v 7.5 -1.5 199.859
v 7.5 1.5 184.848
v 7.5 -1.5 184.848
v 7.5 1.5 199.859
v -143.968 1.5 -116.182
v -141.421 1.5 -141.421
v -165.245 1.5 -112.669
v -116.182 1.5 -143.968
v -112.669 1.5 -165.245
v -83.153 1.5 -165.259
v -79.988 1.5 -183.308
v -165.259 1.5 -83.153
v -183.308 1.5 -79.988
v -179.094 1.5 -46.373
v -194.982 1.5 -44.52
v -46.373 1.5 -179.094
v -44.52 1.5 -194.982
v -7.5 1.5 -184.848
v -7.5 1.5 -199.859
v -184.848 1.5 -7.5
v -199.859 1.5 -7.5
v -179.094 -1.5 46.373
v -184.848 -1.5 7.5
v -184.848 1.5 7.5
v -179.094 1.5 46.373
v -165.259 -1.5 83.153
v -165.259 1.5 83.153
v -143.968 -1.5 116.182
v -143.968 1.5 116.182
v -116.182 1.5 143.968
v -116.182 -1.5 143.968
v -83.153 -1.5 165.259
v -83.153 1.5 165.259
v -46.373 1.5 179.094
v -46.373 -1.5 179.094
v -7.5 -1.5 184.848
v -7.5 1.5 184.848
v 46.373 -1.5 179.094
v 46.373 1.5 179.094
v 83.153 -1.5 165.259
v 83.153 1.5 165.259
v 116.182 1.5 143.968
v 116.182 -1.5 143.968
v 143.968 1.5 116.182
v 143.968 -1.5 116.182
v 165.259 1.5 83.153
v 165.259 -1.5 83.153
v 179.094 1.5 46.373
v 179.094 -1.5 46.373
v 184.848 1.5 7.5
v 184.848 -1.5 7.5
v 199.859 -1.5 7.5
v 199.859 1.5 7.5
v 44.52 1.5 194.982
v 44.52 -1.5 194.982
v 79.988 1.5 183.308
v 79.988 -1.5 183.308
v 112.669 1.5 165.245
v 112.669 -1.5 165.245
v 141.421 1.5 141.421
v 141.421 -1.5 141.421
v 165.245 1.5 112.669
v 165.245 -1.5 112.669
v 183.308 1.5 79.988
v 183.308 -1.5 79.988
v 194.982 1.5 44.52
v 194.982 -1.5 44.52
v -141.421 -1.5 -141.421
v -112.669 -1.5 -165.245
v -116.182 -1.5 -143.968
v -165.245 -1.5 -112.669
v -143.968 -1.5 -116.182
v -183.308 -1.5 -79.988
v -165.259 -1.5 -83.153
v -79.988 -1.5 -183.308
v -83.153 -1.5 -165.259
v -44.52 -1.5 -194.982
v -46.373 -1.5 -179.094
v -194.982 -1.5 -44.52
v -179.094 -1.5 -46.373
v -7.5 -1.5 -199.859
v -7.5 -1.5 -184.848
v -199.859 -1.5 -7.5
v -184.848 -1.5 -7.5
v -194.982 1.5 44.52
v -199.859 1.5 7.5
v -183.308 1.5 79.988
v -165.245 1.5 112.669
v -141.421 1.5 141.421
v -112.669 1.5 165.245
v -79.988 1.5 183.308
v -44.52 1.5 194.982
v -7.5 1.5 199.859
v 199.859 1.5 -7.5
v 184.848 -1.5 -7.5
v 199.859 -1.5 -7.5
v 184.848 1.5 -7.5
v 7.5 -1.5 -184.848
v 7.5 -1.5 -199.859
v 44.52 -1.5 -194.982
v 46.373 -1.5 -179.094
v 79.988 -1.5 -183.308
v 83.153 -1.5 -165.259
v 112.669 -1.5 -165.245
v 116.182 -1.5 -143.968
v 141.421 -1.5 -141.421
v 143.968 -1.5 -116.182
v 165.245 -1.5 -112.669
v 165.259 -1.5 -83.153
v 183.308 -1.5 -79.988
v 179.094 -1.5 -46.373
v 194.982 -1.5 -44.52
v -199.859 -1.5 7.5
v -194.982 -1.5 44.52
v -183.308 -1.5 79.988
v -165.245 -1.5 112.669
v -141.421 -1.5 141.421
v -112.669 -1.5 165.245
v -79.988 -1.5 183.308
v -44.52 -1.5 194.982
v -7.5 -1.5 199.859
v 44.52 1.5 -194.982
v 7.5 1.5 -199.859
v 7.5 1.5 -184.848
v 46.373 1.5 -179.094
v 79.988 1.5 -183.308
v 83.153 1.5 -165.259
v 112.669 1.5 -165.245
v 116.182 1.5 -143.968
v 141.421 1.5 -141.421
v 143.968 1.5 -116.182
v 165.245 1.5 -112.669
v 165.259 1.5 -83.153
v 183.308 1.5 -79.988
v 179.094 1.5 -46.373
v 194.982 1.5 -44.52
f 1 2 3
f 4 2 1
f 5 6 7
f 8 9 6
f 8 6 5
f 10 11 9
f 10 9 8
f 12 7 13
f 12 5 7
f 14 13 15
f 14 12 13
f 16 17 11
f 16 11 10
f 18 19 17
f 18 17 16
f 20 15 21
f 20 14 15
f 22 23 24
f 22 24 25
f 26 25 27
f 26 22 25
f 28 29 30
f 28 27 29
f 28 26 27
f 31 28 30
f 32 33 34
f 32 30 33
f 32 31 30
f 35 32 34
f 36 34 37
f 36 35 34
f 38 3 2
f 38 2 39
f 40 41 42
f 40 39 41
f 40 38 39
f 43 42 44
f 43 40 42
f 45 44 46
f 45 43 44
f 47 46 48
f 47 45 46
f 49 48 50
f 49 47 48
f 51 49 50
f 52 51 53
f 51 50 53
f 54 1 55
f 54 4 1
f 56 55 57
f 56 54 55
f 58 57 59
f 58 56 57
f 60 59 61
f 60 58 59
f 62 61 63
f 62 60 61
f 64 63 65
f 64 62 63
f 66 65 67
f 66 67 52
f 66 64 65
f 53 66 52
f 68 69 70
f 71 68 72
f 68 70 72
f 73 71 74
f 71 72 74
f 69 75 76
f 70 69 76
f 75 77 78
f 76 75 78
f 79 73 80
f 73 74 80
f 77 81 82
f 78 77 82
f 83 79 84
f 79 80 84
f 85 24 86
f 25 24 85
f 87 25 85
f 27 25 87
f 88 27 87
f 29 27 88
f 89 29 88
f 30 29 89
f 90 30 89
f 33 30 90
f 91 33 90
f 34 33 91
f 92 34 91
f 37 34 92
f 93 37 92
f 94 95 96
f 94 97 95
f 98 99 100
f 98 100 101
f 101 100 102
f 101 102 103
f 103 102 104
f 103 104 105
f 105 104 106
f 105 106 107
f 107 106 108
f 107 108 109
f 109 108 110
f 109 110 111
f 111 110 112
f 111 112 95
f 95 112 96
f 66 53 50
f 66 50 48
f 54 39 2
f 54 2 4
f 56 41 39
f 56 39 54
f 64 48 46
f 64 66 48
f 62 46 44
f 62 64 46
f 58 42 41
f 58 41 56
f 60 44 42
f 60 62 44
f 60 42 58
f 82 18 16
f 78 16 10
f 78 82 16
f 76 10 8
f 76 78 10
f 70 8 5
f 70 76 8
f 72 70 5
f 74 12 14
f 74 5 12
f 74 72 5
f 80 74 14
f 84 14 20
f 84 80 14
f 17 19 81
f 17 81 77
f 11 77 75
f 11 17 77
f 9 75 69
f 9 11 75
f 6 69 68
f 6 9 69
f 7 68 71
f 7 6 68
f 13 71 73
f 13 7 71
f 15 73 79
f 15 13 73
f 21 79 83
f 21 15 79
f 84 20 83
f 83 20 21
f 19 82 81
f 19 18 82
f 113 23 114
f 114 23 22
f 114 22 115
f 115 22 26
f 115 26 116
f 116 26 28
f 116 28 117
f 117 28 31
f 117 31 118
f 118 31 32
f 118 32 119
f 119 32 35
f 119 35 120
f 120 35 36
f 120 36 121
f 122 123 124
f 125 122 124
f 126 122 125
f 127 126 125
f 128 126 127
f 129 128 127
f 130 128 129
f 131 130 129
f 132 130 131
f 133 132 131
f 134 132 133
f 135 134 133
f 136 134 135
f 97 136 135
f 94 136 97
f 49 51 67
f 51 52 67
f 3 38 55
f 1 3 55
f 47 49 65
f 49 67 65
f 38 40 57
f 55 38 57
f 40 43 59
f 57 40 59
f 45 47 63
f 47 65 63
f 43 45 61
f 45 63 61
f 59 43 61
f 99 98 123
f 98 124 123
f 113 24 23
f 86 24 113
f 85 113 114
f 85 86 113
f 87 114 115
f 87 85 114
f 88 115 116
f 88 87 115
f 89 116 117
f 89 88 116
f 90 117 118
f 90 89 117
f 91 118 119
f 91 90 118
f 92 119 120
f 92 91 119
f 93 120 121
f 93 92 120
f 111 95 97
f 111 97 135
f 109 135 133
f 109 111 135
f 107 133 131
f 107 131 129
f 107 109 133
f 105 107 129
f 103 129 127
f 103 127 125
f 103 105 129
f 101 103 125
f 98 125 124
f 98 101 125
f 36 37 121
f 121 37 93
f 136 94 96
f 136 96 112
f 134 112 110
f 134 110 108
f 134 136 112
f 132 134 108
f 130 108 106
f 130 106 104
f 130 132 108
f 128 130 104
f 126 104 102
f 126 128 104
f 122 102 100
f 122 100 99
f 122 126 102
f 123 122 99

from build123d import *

# Parameters (mm, degrees)
SKETCH1_R           = 200
SKETCH1_R_2         = 185
BOSS_EXTRUDE1_DEPTH = 1.5
SKETCH2_W           = 69.71067633
SKETCH2_H           = 15
CUT_EXTRUDE1_DEPTH  = 283.846689922
CIRPATTERN1_COUNT   = 4


with BuildPart() as part:
    # Sketch1 → Boss-Extrude1 (new, symmetric)
    with BuildSketch(Plane(origin=(0, 0, 0), x_dir=(1, 0, 0), z_dir=(0, 1, 0))):
        with Locations(Location((0, 0, 0), (0, 0, 270))):
            Circle(SKETCH1_R)
        with Locations(Location((0, 0, 0), (0, 0, 270))):
            Circle(SKETCH1_R_2, mode=Mode.SUBTRACT)
    extrude(amount=BOSS_EXTRUDE1_DEPTH, both=True)

    # Sketch2 → Cut-Extrude1 (cut, symmetric)
    with BuildSketch(Plane(origin=(0, 0, 0), x_dir=(1, 0, 0), z_dir=(0, 1, 0))):
        with Locations((192.5, 0)):
            Rectangle(SKETCH2_W, SKETCH2_H)
    cut_extrude1 = extrude(amount=CUT_EXTRUDE1_DEPTH, both=True, mode=Mode.SUBTRACT)

    # CirPattern1: Cut-Extrude1 ×4 about axis
    cirpattern1_axis = Axis((0, 0, 0), (0, 1, 0))
    for i in range(1, CIRPATTERN1_COUNT):
        add(cut_extrude1.rotate(cirpattern1_axis, i * 360 / CIRPATTERN1_COUNT), mode=Mode.SUBTRACT)


solid = part.part
